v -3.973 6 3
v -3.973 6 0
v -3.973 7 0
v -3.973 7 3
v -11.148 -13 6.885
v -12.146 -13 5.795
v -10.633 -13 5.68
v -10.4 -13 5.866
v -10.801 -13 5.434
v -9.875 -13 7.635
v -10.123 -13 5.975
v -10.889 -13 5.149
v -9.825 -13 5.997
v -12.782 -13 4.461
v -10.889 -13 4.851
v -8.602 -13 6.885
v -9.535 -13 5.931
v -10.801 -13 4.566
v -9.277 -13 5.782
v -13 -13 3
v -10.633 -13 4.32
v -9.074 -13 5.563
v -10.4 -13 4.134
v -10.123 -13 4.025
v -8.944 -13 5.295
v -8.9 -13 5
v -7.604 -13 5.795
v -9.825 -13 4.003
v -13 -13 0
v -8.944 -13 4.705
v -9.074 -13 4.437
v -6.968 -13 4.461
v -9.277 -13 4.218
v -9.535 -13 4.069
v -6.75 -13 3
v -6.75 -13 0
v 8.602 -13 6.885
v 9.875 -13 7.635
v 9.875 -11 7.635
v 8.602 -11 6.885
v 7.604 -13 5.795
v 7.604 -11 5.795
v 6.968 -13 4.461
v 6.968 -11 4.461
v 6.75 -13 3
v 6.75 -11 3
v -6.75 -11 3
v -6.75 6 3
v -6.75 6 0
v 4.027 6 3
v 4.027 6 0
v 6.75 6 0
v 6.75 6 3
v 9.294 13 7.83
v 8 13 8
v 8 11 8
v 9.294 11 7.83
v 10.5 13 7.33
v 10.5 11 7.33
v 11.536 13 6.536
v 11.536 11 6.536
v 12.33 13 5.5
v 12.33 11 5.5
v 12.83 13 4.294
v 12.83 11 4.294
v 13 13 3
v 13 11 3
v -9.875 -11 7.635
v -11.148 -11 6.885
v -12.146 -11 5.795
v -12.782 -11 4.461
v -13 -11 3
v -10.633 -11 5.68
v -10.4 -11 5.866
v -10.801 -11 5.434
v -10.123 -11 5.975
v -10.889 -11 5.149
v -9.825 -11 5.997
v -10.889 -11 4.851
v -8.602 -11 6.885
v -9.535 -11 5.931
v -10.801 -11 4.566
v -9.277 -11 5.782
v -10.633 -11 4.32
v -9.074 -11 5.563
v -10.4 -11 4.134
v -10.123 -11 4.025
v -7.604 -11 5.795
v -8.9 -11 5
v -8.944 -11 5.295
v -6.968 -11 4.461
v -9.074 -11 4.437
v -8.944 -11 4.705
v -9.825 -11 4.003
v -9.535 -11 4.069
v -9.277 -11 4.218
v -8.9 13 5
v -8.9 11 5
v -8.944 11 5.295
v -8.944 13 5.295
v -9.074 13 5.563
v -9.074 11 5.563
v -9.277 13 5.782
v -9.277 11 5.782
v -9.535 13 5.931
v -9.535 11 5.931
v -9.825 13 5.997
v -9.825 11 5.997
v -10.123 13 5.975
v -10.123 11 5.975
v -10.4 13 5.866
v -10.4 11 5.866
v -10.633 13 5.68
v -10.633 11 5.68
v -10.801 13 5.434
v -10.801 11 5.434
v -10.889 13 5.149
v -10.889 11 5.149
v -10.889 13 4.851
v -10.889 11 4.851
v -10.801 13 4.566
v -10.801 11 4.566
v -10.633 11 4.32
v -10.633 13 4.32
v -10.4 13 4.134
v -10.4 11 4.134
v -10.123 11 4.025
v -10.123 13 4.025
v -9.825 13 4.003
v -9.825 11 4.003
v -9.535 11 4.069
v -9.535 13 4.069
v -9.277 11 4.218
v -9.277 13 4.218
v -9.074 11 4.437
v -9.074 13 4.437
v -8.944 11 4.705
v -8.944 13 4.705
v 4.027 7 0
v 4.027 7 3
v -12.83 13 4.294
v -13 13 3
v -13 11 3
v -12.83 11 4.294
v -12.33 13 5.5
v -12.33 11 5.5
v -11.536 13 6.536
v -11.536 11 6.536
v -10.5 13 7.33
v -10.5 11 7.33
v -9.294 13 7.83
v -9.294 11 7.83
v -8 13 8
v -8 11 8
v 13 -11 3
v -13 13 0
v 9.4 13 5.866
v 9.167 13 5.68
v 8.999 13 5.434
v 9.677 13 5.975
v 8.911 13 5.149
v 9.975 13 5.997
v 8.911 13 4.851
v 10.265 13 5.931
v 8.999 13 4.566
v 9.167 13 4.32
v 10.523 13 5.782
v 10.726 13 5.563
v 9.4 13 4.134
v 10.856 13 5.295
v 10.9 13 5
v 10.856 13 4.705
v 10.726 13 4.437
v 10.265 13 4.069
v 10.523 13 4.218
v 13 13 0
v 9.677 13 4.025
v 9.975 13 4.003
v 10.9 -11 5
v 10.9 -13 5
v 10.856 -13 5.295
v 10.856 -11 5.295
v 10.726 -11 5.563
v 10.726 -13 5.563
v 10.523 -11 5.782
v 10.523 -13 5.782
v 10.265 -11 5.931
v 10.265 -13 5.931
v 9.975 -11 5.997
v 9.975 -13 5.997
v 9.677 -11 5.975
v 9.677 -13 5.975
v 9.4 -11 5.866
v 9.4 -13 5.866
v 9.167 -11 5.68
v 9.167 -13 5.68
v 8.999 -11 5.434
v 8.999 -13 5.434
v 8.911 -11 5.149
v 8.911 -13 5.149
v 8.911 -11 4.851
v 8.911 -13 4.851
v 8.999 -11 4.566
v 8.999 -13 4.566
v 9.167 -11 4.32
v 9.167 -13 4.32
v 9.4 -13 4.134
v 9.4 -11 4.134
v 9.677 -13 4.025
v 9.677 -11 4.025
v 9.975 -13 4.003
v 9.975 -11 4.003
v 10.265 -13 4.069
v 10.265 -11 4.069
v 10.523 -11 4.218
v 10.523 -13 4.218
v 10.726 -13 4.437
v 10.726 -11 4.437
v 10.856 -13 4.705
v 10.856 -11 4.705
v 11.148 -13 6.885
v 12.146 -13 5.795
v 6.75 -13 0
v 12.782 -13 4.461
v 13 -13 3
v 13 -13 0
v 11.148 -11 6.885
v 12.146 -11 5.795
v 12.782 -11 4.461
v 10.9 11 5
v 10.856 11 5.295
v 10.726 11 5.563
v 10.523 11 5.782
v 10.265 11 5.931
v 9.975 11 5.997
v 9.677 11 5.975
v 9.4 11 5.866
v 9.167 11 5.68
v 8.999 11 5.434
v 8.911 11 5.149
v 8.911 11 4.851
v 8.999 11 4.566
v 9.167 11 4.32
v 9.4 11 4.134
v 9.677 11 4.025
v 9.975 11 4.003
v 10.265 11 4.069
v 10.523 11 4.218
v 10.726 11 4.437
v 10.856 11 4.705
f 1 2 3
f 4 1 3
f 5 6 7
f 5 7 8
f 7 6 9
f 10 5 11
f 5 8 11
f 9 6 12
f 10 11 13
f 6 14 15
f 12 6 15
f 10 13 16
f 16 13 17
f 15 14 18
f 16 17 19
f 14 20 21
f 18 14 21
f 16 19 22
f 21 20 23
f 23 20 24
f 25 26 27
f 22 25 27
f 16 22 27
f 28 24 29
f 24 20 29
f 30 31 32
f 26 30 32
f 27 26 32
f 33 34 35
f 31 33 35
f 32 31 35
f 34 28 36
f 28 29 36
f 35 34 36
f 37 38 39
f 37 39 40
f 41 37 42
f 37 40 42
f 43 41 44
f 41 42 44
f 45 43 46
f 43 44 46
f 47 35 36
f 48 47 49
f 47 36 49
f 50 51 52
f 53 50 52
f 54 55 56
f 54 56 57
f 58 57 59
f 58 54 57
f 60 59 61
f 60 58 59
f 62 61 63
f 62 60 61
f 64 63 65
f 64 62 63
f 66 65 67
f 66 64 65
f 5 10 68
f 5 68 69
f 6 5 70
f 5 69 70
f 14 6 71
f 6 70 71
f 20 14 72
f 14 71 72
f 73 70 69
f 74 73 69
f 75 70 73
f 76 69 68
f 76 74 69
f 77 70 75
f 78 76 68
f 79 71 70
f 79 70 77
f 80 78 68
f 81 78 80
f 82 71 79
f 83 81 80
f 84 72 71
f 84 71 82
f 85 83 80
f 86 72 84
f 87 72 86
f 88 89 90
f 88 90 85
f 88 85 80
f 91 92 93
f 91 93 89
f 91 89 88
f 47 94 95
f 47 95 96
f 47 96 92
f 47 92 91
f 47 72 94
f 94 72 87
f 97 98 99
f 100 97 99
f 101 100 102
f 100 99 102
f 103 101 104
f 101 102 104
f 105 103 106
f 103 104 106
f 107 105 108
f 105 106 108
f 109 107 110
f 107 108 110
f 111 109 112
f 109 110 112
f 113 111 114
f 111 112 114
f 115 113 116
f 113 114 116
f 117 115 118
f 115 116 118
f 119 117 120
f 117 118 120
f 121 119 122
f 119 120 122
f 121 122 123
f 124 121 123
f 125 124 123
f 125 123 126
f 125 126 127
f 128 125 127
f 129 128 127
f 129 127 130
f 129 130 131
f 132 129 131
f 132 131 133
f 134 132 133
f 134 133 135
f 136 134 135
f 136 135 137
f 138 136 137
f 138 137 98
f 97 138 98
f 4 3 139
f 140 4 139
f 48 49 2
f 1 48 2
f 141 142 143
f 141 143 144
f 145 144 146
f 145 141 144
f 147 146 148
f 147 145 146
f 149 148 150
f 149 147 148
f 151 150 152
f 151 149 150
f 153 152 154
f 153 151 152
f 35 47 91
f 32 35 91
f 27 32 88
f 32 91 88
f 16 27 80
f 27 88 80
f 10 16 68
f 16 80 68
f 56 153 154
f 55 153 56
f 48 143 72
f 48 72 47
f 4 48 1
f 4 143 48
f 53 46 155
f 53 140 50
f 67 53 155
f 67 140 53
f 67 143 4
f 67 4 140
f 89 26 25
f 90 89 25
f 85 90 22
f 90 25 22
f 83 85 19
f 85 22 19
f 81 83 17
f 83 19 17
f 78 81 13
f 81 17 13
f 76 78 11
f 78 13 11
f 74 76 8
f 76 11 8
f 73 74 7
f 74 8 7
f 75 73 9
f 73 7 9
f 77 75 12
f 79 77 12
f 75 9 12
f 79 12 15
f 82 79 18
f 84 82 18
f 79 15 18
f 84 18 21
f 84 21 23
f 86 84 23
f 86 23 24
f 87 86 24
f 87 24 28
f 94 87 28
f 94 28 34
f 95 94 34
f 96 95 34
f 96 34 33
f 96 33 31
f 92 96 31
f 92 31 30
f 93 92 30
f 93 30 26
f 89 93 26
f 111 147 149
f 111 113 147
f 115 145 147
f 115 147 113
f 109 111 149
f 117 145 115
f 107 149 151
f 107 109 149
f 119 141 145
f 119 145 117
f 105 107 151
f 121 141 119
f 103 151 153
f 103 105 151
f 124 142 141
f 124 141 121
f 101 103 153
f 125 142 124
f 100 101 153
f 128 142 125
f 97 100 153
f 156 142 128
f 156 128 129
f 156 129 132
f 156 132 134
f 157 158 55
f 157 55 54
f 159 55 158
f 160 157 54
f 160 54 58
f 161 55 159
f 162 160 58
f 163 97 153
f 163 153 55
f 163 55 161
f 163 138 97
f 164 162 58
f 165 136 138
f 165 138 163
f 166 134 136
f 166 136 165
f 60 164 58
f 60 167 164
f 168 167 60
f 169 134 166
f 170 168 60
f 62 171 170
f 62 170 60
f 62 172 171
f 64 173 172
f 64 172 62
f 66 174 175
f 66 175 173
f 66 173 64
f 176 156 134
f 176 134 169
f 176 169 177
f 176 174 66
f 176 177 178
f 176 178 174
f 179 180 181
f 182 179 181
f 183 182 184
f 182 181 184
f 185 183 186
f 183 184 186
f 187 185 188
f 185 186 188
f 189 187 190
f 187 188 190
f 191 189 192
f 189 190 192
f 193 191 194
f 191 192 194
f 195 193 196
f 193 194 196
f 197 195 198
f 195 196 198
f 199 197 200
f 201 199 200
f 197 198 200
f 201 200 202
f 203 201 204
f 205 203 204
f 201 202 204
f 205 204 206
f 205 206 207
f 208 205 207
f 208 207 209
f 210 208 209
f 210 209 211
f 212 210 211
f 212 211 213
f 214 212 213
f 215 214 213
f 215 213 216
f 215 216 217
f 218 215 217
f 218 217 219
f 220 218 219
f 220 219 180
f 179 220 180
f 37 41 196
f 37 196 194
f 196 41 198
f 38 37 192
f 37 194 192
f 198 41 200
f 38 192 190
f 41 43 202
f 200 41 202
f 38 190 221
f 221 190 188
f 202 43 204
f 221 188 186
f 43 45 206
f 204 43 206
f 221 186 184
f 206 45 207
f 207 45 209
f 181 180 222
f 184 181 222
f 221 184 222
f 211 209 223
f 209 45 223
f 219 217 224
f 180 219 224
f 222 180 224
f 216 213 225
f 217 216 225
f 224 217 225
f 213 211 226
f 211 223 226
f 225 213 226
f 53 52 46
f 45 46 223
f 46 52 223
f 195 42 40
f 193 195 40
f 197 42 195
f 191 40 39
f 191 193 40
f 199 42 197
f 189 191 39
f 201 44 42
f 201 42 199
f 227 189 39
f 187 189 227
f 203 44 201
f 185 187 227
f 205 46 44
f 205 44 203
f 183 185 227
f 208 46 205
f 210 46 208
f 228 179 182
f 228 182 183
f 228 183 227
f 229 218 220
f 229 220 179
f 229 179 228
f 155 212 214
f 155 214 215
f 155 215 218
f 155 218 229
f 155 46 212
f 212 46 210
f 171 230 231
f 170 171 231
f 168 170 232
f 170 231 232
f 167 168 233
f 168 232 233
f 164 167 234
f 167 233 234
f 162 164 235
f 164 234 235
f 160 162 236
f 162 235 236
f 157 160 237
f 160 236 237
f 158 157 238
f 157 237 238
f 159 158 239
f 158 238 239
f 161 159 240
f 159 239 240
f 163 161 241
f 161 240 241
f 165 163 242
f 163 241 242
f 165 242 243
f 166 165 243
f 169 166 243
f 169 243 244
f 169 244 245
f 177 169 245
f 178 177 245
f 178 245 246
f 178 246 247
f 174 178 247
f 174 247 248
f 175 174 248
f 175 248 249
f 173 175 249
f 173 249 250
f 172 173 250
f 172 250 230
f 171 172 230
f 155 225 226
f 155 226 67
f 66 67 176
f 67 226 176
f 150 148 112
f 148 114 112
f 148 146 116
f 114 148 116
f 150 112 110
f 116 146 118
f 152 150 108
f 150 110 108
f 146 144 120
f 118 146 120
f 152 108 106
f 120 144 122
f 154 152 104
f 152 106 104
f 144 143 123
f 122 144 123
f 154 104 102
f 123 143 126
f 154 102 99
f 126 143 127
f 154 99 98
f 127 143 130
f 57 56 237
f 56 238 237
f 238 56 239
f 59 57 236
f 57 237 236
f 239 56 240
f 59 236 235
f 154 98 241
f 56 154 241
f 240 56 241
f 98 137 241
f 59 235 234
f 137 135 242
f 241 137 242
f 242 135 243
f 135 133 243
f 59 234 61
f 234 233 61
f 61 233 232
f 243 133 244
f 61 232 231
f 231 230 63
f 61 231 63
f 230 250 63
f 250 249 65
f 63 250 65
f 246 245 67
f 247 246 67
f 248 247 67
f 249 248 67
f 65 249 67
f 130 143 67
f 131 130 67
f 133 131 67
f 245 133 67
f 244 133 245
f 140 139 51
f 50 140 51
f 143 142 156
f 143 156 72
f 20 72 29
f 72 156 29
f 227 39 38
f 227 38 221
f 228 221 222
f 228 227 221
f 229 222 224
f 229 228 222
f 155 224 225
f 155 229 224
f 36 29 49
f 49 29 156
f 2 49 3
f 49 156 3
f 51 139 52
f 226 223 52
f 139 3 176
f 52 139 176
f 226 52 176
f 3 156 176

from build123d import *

# Parameters (mm, degrees)
F0_W        = 26
F0_H        = 2
F1_DEPTH    = 8
F0_W_2      = 6.25
F2_DEPTH    = 3
F3_T1_DEPTH = 27
F3_T3_DEPTH = 27
F4_R        = 1
F5_DEPTH    = 30


# Not quite as in the source:
# - a fillet or chamfer that OpenCascade refuses, or shapes differently, is made with other operations: its cross-section is extruded or revolved along the edge and cut away or added


with BuildPart() as f1:
    # F0 (on Top) → F1 (new body)
    with BuildSketch(Plane.XY):
        with Locations((0, 12)):
            Rectangle(F0_W, F0_H)
    extrude(amount=F1_DEPTH)



with BuildPart() as f1b:
    # F0 (on Top) → F1, piece 2 (new body)
    with BuildSketch(Plane.XY):
        with Locations((-9.875, -12)):
            Rectangle(F0_W_2, F0_H)
    extrude(amount=F1_DEPTH)


with BuildPart() as f1c:
    # F0 (on Top) → F1, piece 3 (new body)
    with BuildSketch(Plane.XY):
        with Locations((9.875, -12)):
            Rectangle(F0_W_2, F0_H)
    extrude(amount=F1_DEPTH)


with BuildPart() as f1_1:
    add(f1.part)

    add(f1b.part)  # F2 merges F1b

    add(f1c.part)  # F2 merges F1c
    # F0 (on Top) → F2 (join)
    with BuildSketch(Plane.XY):
        Polygon((6.75, -11), (13, -11), (13, 11), (-13, 11), (-13, -11), (-6.75, -11), (-6.75, 6), (-3.9725974202, 6), (-3.9725974202, 7), (4.0274025798, 7), (4.0274025798, 6), (6.75, 6), align=None)
    extrude(amount=F2_DEPTH)

    # F3: fillet of radius 5 on 6 edges, made by hand

    # F3_s2 → F3_t1 (cut)
    with BuildSketch(Plane.XZ.offset(-1.5)):
        with BuildLine():
            ThreePointArc((-8, 8), (-11.5355339059, 6.5355339059), (-13, 3))
            Line((-13, 3), (-13, 8))
            Line((-13, 8), (-8, 8))
        make_face()
        with BuildLine():
            ThreePointArc((-6.75, 3), (-8.2144660941, 6.5355339059), (-11.75, 8))
            Line((-11.75, 8), (-6.75, 8))
            Line((-6.75, 8), (-6.75, 3))
        make_face()
        with BuildLine():
            ThreePointArc((11.75, 8), (8.2144660941, 6.5355339059), (6.75, 3))
            Line((6.75, 3), (6.75, 8))
            Line((6.75, 8), (11.75, 8))
        make_face()
        with BuildLine():
            ThreePointArc((8, 8), (11.5355339059, 6.5355339059), (13, 3))
            Line((13, 3), (13, 8))
            Line((13, 8), (8, 8))
        make_face()
    extrude(amount=F3_T1_DEPTH, mode=Mode.SUBTRACT)

    # F3_s4 → F3_t3 (cut)
    with BuildSketch(Plane.XZ.offset(-25.5)):
        with BuildLine():
            ThreePointArc((8, 8), (11.5355339059, 6.5355339059), (13, 3))
            Line((13, 3), (13, 8))
            Line((13, 8), (8, 8))
        make_face()
        with BuildLine():
            ThreePointArc((-13, 3), (-11.5355339059, 6.5355339059), (-8, 8))
            Line((-8, 8), (-13, 8))
            Line((-13, 8), (-13, 3))
        make_face()
    extrude(amount=F3_T3_DEPTH, mode=Mode.SUBTRACT)

    # F4 (on face) → F5 (cut)
    with BuildSketch(Plane.XZ.offset(13)):
        with Locations((-9.9, 5)):
            Circle(F4_R)
        with Locations((9.9, 5)):
            Circle(F4_R)
    extrude(amount=-F5_DEPTH, mode=Mode.SUBTRACT)


solid = f1_1.part
